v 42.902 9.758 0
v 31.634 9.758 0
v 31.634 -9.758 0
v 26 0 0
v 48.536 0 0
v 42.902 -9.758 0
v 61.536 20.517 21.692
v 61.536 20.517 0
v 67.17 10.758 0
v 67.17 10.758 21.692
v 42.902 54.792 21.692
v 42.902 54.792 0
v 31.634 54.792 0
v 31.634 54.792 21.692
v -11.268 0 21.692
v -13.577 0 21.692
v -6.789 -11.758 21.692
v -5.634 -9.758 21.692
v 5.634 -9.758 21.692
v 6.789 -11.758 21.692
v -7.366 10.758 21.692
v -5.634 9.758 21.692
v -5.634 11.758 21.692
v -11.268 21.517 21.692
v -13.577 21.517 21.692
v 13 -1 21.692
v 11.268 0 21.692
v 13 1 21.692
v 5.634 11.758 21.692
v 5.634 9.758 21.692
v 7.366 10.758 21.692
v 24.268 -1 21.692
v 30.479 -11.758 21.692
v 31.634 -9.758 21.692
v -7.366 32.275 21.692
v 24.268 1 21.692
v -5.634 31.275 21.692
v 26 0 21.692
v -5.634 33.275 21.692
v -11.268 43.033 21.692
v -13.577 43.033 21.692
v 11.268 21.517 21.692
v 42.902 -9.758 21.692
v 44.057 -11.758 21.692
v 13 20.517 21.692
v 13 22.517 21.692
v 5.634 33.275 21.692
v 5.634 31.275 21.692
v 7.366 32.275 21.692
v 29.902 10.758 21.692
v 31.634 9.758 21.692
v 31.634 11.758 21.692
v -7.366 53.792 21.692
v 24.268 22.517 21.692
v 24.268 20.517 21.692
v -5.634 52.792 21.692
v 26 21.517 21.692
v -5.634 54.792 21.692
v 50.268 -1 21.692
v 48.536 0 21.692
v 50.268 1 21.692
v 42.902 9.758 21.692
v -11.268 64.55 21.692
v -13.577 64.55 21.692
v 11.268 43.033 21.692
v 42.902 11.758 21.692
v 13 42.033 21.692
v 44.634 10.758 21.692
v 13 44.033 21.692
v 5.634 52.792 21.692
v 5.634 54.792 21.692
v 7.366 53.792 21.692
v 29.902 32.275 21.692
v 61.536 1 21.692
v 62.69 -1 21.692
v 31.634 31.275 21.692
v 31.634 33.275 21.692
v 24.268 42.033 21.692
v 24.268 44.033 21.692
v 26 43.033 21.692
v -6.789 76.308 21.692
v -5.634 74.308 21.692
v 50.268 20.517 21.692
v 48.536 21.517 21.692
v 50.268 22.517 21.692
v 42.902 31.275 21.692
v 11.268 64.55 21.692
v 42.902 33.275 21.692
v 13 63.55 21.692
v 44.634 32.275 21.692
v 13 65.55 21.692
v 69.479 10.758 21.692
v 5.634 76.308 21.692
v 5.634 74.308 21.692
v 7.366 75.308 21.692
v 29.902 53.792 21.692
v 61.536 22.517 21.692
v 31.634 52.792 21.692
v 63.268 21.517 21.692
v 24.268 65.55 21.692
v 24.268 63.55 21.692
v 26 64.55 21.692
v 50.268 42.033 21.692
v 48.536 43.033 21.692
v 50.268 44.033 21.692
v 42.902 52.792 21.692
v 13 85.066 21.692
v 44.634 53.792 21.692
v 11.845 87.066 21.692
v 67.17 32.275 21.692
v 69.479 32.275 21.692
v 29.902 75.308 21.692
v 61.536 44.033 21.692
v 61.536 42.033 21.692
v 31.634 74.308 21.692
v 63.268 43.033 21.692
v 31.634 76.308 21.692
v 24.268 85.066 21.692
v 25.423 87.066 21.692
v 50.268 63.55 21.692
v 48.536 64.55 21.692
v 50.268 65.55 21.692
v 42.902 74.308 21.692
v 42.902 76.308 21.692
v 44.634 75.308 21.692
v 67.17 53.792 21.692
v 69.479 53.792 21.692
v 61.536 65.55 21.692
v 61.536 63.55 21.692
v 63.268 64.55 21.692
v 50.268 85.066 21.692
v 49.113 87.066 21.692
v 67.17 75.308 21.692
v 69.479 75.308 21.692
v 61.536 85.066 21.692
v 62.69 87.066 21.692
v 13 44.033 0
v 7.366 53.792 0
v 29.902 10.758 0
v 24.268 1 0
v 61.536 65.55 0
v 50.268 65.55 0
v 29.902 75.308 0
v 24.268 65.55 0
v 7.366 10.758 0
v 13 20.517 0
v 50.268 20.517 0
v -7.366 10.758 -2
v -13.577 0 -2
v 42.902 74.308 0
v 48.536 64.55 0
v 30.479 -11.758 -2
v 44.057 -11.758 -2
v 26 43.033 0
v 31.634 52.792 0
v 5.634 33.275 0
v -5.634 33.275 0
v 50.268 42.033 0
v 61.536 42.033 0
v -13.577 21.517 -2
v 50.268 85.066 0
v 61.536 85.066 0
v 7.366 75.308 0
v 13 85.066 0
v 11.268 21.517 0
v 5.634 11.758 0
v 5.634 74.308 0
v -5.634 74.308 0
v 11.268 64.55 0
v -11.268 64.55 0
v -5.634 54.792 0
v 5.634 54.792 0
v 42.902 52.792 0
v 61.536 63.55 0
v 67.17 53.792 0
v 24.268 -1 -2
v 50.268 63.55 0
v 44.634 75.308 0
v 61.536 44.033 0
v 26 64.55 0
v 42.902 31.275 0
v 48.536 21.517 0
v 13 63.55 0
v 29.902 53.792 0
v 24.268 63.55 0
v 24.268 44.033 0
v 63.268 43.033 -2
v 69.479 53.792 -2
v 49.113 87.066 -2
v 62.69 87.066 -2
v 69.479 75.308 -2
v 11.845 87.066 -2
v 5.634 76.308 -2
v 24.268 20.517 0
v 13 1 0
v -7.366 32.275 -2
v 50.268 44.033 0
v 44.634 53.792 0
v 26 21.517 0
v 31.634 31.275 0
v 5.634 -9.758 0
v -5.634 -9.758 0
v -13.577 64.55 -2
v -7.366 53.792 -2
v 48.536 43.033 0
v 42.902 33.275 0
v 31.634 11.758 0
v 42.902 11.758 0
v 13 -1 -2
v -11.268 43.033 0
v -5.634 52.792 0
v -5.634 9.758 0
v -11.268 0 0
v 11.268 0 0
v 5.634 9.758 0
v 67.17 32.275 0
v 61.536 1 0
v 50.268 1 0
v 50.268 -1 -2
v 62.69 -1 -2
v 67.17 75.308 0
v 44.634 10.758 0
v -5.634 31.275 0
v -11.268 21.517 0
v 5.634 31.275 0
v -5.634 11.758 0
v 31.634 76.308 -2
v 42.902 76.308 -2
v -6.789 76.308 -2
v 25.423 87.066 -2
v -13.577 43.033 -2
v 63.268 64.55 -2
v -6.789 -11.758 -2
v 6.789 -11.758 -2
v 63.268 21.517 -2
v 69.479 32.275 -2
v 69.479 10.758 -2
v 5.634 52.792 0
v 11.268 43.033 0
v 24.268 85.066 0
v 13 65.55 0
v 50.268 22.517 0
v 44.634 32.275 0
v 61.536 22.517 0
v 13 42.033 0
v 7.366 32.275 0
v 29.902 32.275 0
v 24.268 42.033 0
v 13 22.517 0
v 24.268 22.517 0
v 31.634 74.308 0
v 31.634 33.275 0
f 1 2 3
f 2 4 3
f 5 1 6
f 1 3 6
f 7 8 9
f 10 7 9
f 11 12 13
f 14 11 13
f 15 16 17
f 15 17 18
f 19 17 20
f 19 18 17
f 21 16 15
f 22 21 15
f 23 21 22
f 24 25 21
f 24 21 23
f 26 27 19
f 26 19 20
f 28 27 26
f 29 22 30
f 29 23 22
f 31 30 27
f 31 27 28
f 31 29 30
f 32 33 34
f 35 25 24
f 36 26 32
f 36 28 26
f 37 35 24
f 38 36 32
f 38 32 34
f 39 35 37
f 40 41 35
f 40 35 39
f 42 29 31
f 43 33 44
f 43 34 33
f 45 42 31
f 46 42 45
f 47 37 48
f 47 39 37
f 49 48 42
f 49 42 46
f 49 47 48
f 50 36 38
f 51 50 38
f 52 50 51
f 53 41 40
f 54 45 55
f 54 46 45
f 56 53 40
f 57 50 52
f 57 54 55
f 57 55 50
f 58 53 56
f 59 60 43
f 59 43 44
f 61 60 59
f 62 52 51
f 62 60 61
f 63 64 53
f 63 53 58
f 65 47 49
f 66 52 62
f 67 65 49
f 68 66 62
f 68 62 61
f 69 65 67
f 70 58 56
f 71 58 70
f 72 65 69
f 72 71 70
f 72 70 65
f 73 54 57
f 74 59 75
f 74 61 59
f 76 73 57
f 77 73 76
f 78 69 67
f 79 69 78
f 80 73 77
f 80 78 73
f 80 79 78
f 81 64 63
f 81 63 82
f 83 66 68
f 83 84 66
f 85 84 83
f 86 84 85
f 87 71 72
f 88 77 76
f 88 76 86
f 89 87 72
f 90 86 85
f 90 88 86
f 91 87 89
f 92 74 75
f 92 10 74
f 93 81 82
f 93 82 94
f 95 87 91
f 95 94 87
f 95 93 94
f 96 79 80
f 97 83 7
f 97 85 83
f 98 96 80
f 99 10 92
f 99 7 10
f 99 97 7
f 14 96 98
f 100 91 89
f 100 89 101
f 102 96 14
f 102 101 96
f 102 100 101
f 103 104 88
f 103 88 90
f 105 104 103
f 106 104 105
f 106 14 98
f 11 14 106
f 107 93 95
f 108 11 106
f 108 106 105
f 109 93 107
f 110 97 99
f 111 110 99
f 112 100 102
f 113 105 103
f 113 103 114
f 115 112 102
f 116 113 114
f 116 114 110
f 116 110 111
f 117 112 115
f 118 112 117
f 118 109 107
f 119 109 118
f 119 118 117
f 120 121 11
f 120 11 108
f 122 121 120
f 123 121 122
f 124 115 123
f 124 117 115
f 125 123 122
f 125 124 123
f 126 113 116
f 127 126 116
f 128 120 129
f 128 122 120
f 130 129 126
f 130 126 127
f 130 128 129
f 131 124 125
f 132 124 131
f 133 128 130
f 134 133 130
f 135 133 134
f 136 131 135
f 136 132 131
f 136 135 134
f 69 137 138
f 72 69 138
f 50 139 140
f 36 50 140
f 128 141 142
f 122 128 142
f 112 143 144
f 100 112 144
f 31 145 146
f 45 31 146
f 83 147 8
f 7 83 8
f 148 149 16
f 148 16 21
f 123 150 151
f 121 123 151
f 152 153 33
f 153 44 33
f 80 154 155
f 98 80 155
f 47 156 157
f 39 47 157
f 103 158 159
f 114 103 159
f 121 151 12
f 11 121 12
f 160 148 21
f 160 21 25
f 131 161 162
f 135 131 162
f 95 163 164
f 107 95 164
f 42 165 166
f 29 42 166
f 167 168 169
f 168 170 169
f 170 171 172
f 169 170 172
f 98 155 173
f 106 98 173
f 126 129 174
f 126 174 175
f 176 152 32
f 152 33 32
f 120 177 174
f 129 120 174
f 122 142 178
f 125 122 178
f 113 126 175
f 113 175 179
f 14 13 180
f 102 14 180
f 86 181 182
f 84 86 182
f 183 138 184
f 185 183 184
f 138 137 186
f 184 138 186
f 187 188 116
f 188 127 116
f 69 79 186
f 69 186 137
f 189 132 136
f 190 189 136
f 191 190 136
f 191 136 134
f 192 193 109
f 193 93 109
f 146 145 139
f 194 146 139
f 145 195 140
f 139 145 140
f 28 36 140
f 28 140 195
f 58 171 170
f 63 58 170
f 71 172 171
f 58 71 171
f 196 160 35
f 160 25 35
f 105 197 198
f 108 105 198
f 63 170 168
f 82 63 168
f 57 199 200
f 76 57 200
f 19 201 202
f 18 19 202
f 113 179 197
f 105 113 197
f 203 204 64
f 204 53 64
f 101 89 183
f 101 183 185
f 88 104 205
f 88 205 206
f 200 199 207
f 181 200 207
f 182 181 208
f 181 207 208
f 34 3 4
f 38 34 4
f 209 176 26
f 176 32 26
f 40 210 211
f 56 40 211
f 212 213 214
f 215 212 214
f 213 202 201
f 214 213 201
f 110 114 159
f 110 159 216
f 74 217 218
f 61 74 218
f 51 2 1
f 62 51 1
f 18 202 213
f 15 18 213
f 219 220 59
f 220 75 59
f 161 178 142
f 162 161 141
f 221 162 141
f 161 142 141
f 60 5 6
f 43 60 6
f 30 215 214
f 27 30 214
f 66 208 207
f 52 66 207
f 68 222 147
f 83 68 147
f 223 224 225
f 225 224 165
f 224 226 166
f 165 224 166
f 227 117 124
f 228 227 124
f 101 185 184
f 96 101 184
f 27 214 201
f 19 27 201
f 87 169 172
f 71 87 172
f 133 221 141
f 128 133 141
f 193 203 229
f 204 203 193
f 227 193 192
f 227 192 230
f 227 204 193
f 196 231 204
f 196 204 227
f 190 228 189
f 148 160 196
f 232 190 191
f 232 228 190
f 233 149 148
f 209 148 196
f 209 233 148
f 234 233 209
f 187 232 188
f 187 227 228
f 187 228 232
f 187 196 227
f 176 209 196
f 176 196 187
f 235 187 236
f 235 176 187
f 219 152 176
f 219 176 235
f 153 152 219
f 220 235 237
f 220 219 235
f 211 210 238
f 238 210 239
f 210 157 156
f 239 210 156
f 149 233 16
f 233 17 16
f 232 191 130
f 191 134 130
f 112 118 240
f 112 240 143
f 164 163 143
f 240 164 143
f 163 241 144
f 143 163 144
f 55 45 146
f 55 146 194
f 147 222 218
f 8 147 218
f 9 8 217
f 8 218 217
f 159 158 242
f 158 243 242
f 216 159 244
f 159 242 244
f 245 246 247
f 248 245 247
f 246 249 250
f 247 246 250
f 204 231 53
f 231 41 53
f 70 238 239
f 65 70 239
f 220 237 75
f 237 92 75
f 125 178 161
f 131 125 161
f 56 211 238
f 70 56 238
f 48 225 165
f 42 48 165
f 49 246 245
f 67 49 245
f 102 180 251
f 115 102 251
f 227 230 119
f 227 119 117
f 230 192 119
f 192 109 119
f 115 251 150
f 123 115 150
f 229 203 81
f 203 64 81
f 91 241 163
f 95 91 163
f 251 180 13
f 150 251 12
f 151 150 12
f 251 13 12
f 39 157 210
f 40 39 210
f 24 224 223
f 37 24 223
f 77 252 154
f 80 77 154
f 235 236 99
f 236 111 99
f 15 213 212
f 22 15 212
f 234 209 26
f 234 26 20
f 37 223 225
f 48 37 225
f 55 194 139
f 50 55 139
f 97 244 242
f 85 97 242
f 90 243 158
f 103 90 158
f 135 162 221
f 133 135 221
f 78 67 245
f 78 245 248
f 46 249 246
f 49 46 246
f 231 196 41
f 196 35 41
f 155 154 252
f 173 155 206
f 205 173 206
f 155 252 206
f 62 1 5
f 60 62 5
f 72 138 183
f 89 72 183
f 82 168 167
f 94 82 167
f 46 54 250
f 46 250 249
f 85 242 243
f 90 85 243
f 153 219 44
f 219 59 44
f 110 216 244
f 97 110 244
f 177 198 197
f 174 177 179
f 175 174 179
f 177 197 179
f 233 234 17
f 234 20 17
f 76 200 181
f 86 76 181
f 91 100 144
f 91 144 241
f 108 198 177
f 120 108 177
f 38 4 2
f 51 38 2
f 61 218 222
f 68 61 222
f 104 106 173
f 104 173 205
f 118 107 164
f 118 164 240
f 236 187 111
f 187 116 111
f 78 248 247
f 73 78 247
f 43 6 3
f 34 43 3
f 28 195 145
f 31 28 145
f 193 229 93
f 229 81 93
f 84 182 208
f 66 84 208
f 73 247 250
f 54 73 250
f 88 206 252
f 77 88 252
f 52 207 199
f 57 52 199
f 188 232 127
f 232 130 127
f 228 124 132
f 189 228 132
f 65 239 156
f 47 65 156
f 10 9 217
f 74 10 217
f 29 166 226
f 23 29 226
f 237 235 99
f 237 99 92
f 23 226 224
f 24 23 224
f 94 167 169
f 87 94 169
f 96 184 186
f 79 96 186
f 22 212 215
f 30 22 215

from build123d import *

# Parameters (mm, degrees)
F1_DEPTH = 21.6916
F3_DEPTH = 2


with BuildPart() as f1:
    # F0 (on Top) → F1 (new body)
    with BuildSketch(Plane.XY):
        Polygon((31.633887, 76.3081), (25.42258, 87.0664), (11.845265, 87.0664), (5.633957, 76.3081), (-6.788658, 76.3081), (-13.577315, 64.5498), (-7.366008, 53.7915), (-13.577315, 43.0332), (-7.366008, 32.2749), (-13.577315, 21.5166), (-7.366008, 10.7583), (-13.577315, 0), (-6.788658, -11.7583), (6.788658, -11.7583), (12.999965, -1), (24.267879, -1), (30.479187, -11.7583), (44.056502, -11.7583), (50.267809, -1), (62.690424, -1), (69.479082, 10.7583), (63.267775, 21.5166), (69.479082, 32.2749), (63.267775, 43.0332), (69.479082, 53.7915), (63.267775, 64.5498), (69.479082, 75.3081), (62.690424, 87.0664), (49.113109, 87.0664), (42.901802, 76.3081), align=None)
        Polygon((-5.633957, 9.7583), (5.633957, 9.7583), (11.267914, 0), (5.633957, -9.7583), (-5.633957, -9.7583), (-11.267914, 0), align=None, mode=Mode.SUBTRACT)
        Polygon((12.999965, 20.5166), (24.267879, 20.5166), (29.901836, 10.7583), (24.267879, 1), (12.999965, 1), (7.366008, 10.7583), align=None, mode=Mode.SUBTRACT)
        Polygon((11.267914, 21.5166), (5.633957, 11.7583), (-5.633957, 11.7583), (-11.267914, 21.5166), (-5.633957, 31.2749), (5.633957, 31.2749), align=None, mode=Mode.SUBTRACT)
        Polygon((24.267879, 22.5166), (12.999965, 22.5166), (7.366008, 32.2749), (12.999965, 42.0332), (24.267879, 42.0332), (29.901836, 32.2749), align=None, mode=Mode.SUBTRACT)
        Polygon((48.535759, 0), (42.901802, -9.7583), (31.633887, -9.7583), (25.99993, 0), (31.633887, 9.7583), (42.901802, 9.7583), align=None, mode=Mode.SUBTRACT)
        Polygon((61.535724, 1), (50.267809, 1), (44.633852, 10.7583), (50.267809, 20.5166), (61.535724, 20.5166), (67.169681, 10.7583), align=None, mode=Mode.SUBTRACT)
        Polygon((25.99993, 21.5166), (31.633887, 31.2749), (42.901802, 31.2749), (48.535759, 21.5166), (42.901802, 11.7583), (31.633887, 11.7583), align=None, mode=Mode.SUBTRACT)
        Polygon((67.169681, 32.2749), (61.535724, 22.5166), (50.267809, 22.5166), (44.633852, 32.2749), (50.267809, 42.0332), (61.535724, 42.0332), align=None, mode=Mode.SUBTRACT)
        Polygon((11.267914, 43.0332), (5.633957, 33.2749), (-5.633957, 33.2749), (-11.267914, 43.0332), (-5.633957, 52.7915), (5.633957, 52.7915), align=None, mode=Mode.SUBTRACT)
        Polygon((24.267879, 44.0332), (12.999965, 44.0332), (7.366008, 53.7915), (12.999965, 63.5498), (24.267879, 63.5498), (29.901836, 53.7915), align=None, mode=Mode.SUBTRACT)
        Polygon((11.267914, 64.5498), (5.633957, 54.7915), (-5.633957, 54.7915), (-11.267914, 64.5498), (-5.633957, 74.3081), (5.633957, 74.3081), align=None, mode=Mode.SUBTRACT)
        Polygon((24.267879, 65.5498), (12.999965, 65.5498), (7.366008, 75.3081), (12.999965, 85.0664), (24.267879, 85.0664), (29.901836, 75.3081), align=None, mode=Mode.SUBTRACT)
        Polygon((25.99993, 43.0332), (31.633887, 52.7915), (42.901802, 52.7915), (48.535759, 43.0332), (42.901802, 33.2749), (31.633887, 33.2749), align=None, mode=Mode.SUBTRACT)
        Polygon((50.267809, 63.5498), (61.535724, 63.5498), (67.169681, 53.7915), (61.535724, 44.0332), (50.267809, 44.0332), (44.633852, 53.7915), align=None, mode=Mode.SUBTRACT)
        Polygon((31.633887, 54.7915), (25.99993, 64.5498), (31.633887, 74.3081), (42.901802, 74.3081), (48.535759, 64.5498), (42.901802, 54.7915), align=None, mode=Mode.SUBTRACT)
        Polygon((44.633852, 75.3081), (50.267809, 85.0664), (61.535724, 85.0664), (67.169681, 75.3081), (61.535724, 65.5498), (50.267809, 65.5498), align=None, mode=Mode.SUBTRACT)
    extrude(amount=F1_DEPTH)

    # F2 (on face) → F3 (join)
    with BuildSketch(Plane(origin=(0, 0, 0), x_dir=(1, 0, 0), z_dir=(0, 0, -1))):
        Polygon((49.113109, -87.0664), (62.690424, -87.0664), (69.479082, -75.3081), (63.267775, -64.5498), (69.479082, -53.7915), (63.267775, -43.0332), (69.479082, -32.2749), (63.267775, -21.5166), (69.479082, -10.7583), (62.690424, 1), (50.267809, 1), (44.056502, 11.7583), (30.479187, 11.7583), (24.267879, 1), (12.999965, 1), (6.788658, 11.7583), (-6.788658, 11.7583), (-13.577315, 0), (-7.366008, -10.7583), (-13.577315, -21.5166), (-7.366008, -32.2749), (-13.577315, -43.0332), (-7.366008, -53.7915), (-13.577315, -64.5498), (-6.788658, -76.3081), (5.633957, -76.3081), (11.845265, -87.0664), (25.42258, -87.0664), (31.633887, -76.3081), (42.901802, -76.3081), align=None)
    extrude(amount=F3_DEPTH)


solid = f1.part
